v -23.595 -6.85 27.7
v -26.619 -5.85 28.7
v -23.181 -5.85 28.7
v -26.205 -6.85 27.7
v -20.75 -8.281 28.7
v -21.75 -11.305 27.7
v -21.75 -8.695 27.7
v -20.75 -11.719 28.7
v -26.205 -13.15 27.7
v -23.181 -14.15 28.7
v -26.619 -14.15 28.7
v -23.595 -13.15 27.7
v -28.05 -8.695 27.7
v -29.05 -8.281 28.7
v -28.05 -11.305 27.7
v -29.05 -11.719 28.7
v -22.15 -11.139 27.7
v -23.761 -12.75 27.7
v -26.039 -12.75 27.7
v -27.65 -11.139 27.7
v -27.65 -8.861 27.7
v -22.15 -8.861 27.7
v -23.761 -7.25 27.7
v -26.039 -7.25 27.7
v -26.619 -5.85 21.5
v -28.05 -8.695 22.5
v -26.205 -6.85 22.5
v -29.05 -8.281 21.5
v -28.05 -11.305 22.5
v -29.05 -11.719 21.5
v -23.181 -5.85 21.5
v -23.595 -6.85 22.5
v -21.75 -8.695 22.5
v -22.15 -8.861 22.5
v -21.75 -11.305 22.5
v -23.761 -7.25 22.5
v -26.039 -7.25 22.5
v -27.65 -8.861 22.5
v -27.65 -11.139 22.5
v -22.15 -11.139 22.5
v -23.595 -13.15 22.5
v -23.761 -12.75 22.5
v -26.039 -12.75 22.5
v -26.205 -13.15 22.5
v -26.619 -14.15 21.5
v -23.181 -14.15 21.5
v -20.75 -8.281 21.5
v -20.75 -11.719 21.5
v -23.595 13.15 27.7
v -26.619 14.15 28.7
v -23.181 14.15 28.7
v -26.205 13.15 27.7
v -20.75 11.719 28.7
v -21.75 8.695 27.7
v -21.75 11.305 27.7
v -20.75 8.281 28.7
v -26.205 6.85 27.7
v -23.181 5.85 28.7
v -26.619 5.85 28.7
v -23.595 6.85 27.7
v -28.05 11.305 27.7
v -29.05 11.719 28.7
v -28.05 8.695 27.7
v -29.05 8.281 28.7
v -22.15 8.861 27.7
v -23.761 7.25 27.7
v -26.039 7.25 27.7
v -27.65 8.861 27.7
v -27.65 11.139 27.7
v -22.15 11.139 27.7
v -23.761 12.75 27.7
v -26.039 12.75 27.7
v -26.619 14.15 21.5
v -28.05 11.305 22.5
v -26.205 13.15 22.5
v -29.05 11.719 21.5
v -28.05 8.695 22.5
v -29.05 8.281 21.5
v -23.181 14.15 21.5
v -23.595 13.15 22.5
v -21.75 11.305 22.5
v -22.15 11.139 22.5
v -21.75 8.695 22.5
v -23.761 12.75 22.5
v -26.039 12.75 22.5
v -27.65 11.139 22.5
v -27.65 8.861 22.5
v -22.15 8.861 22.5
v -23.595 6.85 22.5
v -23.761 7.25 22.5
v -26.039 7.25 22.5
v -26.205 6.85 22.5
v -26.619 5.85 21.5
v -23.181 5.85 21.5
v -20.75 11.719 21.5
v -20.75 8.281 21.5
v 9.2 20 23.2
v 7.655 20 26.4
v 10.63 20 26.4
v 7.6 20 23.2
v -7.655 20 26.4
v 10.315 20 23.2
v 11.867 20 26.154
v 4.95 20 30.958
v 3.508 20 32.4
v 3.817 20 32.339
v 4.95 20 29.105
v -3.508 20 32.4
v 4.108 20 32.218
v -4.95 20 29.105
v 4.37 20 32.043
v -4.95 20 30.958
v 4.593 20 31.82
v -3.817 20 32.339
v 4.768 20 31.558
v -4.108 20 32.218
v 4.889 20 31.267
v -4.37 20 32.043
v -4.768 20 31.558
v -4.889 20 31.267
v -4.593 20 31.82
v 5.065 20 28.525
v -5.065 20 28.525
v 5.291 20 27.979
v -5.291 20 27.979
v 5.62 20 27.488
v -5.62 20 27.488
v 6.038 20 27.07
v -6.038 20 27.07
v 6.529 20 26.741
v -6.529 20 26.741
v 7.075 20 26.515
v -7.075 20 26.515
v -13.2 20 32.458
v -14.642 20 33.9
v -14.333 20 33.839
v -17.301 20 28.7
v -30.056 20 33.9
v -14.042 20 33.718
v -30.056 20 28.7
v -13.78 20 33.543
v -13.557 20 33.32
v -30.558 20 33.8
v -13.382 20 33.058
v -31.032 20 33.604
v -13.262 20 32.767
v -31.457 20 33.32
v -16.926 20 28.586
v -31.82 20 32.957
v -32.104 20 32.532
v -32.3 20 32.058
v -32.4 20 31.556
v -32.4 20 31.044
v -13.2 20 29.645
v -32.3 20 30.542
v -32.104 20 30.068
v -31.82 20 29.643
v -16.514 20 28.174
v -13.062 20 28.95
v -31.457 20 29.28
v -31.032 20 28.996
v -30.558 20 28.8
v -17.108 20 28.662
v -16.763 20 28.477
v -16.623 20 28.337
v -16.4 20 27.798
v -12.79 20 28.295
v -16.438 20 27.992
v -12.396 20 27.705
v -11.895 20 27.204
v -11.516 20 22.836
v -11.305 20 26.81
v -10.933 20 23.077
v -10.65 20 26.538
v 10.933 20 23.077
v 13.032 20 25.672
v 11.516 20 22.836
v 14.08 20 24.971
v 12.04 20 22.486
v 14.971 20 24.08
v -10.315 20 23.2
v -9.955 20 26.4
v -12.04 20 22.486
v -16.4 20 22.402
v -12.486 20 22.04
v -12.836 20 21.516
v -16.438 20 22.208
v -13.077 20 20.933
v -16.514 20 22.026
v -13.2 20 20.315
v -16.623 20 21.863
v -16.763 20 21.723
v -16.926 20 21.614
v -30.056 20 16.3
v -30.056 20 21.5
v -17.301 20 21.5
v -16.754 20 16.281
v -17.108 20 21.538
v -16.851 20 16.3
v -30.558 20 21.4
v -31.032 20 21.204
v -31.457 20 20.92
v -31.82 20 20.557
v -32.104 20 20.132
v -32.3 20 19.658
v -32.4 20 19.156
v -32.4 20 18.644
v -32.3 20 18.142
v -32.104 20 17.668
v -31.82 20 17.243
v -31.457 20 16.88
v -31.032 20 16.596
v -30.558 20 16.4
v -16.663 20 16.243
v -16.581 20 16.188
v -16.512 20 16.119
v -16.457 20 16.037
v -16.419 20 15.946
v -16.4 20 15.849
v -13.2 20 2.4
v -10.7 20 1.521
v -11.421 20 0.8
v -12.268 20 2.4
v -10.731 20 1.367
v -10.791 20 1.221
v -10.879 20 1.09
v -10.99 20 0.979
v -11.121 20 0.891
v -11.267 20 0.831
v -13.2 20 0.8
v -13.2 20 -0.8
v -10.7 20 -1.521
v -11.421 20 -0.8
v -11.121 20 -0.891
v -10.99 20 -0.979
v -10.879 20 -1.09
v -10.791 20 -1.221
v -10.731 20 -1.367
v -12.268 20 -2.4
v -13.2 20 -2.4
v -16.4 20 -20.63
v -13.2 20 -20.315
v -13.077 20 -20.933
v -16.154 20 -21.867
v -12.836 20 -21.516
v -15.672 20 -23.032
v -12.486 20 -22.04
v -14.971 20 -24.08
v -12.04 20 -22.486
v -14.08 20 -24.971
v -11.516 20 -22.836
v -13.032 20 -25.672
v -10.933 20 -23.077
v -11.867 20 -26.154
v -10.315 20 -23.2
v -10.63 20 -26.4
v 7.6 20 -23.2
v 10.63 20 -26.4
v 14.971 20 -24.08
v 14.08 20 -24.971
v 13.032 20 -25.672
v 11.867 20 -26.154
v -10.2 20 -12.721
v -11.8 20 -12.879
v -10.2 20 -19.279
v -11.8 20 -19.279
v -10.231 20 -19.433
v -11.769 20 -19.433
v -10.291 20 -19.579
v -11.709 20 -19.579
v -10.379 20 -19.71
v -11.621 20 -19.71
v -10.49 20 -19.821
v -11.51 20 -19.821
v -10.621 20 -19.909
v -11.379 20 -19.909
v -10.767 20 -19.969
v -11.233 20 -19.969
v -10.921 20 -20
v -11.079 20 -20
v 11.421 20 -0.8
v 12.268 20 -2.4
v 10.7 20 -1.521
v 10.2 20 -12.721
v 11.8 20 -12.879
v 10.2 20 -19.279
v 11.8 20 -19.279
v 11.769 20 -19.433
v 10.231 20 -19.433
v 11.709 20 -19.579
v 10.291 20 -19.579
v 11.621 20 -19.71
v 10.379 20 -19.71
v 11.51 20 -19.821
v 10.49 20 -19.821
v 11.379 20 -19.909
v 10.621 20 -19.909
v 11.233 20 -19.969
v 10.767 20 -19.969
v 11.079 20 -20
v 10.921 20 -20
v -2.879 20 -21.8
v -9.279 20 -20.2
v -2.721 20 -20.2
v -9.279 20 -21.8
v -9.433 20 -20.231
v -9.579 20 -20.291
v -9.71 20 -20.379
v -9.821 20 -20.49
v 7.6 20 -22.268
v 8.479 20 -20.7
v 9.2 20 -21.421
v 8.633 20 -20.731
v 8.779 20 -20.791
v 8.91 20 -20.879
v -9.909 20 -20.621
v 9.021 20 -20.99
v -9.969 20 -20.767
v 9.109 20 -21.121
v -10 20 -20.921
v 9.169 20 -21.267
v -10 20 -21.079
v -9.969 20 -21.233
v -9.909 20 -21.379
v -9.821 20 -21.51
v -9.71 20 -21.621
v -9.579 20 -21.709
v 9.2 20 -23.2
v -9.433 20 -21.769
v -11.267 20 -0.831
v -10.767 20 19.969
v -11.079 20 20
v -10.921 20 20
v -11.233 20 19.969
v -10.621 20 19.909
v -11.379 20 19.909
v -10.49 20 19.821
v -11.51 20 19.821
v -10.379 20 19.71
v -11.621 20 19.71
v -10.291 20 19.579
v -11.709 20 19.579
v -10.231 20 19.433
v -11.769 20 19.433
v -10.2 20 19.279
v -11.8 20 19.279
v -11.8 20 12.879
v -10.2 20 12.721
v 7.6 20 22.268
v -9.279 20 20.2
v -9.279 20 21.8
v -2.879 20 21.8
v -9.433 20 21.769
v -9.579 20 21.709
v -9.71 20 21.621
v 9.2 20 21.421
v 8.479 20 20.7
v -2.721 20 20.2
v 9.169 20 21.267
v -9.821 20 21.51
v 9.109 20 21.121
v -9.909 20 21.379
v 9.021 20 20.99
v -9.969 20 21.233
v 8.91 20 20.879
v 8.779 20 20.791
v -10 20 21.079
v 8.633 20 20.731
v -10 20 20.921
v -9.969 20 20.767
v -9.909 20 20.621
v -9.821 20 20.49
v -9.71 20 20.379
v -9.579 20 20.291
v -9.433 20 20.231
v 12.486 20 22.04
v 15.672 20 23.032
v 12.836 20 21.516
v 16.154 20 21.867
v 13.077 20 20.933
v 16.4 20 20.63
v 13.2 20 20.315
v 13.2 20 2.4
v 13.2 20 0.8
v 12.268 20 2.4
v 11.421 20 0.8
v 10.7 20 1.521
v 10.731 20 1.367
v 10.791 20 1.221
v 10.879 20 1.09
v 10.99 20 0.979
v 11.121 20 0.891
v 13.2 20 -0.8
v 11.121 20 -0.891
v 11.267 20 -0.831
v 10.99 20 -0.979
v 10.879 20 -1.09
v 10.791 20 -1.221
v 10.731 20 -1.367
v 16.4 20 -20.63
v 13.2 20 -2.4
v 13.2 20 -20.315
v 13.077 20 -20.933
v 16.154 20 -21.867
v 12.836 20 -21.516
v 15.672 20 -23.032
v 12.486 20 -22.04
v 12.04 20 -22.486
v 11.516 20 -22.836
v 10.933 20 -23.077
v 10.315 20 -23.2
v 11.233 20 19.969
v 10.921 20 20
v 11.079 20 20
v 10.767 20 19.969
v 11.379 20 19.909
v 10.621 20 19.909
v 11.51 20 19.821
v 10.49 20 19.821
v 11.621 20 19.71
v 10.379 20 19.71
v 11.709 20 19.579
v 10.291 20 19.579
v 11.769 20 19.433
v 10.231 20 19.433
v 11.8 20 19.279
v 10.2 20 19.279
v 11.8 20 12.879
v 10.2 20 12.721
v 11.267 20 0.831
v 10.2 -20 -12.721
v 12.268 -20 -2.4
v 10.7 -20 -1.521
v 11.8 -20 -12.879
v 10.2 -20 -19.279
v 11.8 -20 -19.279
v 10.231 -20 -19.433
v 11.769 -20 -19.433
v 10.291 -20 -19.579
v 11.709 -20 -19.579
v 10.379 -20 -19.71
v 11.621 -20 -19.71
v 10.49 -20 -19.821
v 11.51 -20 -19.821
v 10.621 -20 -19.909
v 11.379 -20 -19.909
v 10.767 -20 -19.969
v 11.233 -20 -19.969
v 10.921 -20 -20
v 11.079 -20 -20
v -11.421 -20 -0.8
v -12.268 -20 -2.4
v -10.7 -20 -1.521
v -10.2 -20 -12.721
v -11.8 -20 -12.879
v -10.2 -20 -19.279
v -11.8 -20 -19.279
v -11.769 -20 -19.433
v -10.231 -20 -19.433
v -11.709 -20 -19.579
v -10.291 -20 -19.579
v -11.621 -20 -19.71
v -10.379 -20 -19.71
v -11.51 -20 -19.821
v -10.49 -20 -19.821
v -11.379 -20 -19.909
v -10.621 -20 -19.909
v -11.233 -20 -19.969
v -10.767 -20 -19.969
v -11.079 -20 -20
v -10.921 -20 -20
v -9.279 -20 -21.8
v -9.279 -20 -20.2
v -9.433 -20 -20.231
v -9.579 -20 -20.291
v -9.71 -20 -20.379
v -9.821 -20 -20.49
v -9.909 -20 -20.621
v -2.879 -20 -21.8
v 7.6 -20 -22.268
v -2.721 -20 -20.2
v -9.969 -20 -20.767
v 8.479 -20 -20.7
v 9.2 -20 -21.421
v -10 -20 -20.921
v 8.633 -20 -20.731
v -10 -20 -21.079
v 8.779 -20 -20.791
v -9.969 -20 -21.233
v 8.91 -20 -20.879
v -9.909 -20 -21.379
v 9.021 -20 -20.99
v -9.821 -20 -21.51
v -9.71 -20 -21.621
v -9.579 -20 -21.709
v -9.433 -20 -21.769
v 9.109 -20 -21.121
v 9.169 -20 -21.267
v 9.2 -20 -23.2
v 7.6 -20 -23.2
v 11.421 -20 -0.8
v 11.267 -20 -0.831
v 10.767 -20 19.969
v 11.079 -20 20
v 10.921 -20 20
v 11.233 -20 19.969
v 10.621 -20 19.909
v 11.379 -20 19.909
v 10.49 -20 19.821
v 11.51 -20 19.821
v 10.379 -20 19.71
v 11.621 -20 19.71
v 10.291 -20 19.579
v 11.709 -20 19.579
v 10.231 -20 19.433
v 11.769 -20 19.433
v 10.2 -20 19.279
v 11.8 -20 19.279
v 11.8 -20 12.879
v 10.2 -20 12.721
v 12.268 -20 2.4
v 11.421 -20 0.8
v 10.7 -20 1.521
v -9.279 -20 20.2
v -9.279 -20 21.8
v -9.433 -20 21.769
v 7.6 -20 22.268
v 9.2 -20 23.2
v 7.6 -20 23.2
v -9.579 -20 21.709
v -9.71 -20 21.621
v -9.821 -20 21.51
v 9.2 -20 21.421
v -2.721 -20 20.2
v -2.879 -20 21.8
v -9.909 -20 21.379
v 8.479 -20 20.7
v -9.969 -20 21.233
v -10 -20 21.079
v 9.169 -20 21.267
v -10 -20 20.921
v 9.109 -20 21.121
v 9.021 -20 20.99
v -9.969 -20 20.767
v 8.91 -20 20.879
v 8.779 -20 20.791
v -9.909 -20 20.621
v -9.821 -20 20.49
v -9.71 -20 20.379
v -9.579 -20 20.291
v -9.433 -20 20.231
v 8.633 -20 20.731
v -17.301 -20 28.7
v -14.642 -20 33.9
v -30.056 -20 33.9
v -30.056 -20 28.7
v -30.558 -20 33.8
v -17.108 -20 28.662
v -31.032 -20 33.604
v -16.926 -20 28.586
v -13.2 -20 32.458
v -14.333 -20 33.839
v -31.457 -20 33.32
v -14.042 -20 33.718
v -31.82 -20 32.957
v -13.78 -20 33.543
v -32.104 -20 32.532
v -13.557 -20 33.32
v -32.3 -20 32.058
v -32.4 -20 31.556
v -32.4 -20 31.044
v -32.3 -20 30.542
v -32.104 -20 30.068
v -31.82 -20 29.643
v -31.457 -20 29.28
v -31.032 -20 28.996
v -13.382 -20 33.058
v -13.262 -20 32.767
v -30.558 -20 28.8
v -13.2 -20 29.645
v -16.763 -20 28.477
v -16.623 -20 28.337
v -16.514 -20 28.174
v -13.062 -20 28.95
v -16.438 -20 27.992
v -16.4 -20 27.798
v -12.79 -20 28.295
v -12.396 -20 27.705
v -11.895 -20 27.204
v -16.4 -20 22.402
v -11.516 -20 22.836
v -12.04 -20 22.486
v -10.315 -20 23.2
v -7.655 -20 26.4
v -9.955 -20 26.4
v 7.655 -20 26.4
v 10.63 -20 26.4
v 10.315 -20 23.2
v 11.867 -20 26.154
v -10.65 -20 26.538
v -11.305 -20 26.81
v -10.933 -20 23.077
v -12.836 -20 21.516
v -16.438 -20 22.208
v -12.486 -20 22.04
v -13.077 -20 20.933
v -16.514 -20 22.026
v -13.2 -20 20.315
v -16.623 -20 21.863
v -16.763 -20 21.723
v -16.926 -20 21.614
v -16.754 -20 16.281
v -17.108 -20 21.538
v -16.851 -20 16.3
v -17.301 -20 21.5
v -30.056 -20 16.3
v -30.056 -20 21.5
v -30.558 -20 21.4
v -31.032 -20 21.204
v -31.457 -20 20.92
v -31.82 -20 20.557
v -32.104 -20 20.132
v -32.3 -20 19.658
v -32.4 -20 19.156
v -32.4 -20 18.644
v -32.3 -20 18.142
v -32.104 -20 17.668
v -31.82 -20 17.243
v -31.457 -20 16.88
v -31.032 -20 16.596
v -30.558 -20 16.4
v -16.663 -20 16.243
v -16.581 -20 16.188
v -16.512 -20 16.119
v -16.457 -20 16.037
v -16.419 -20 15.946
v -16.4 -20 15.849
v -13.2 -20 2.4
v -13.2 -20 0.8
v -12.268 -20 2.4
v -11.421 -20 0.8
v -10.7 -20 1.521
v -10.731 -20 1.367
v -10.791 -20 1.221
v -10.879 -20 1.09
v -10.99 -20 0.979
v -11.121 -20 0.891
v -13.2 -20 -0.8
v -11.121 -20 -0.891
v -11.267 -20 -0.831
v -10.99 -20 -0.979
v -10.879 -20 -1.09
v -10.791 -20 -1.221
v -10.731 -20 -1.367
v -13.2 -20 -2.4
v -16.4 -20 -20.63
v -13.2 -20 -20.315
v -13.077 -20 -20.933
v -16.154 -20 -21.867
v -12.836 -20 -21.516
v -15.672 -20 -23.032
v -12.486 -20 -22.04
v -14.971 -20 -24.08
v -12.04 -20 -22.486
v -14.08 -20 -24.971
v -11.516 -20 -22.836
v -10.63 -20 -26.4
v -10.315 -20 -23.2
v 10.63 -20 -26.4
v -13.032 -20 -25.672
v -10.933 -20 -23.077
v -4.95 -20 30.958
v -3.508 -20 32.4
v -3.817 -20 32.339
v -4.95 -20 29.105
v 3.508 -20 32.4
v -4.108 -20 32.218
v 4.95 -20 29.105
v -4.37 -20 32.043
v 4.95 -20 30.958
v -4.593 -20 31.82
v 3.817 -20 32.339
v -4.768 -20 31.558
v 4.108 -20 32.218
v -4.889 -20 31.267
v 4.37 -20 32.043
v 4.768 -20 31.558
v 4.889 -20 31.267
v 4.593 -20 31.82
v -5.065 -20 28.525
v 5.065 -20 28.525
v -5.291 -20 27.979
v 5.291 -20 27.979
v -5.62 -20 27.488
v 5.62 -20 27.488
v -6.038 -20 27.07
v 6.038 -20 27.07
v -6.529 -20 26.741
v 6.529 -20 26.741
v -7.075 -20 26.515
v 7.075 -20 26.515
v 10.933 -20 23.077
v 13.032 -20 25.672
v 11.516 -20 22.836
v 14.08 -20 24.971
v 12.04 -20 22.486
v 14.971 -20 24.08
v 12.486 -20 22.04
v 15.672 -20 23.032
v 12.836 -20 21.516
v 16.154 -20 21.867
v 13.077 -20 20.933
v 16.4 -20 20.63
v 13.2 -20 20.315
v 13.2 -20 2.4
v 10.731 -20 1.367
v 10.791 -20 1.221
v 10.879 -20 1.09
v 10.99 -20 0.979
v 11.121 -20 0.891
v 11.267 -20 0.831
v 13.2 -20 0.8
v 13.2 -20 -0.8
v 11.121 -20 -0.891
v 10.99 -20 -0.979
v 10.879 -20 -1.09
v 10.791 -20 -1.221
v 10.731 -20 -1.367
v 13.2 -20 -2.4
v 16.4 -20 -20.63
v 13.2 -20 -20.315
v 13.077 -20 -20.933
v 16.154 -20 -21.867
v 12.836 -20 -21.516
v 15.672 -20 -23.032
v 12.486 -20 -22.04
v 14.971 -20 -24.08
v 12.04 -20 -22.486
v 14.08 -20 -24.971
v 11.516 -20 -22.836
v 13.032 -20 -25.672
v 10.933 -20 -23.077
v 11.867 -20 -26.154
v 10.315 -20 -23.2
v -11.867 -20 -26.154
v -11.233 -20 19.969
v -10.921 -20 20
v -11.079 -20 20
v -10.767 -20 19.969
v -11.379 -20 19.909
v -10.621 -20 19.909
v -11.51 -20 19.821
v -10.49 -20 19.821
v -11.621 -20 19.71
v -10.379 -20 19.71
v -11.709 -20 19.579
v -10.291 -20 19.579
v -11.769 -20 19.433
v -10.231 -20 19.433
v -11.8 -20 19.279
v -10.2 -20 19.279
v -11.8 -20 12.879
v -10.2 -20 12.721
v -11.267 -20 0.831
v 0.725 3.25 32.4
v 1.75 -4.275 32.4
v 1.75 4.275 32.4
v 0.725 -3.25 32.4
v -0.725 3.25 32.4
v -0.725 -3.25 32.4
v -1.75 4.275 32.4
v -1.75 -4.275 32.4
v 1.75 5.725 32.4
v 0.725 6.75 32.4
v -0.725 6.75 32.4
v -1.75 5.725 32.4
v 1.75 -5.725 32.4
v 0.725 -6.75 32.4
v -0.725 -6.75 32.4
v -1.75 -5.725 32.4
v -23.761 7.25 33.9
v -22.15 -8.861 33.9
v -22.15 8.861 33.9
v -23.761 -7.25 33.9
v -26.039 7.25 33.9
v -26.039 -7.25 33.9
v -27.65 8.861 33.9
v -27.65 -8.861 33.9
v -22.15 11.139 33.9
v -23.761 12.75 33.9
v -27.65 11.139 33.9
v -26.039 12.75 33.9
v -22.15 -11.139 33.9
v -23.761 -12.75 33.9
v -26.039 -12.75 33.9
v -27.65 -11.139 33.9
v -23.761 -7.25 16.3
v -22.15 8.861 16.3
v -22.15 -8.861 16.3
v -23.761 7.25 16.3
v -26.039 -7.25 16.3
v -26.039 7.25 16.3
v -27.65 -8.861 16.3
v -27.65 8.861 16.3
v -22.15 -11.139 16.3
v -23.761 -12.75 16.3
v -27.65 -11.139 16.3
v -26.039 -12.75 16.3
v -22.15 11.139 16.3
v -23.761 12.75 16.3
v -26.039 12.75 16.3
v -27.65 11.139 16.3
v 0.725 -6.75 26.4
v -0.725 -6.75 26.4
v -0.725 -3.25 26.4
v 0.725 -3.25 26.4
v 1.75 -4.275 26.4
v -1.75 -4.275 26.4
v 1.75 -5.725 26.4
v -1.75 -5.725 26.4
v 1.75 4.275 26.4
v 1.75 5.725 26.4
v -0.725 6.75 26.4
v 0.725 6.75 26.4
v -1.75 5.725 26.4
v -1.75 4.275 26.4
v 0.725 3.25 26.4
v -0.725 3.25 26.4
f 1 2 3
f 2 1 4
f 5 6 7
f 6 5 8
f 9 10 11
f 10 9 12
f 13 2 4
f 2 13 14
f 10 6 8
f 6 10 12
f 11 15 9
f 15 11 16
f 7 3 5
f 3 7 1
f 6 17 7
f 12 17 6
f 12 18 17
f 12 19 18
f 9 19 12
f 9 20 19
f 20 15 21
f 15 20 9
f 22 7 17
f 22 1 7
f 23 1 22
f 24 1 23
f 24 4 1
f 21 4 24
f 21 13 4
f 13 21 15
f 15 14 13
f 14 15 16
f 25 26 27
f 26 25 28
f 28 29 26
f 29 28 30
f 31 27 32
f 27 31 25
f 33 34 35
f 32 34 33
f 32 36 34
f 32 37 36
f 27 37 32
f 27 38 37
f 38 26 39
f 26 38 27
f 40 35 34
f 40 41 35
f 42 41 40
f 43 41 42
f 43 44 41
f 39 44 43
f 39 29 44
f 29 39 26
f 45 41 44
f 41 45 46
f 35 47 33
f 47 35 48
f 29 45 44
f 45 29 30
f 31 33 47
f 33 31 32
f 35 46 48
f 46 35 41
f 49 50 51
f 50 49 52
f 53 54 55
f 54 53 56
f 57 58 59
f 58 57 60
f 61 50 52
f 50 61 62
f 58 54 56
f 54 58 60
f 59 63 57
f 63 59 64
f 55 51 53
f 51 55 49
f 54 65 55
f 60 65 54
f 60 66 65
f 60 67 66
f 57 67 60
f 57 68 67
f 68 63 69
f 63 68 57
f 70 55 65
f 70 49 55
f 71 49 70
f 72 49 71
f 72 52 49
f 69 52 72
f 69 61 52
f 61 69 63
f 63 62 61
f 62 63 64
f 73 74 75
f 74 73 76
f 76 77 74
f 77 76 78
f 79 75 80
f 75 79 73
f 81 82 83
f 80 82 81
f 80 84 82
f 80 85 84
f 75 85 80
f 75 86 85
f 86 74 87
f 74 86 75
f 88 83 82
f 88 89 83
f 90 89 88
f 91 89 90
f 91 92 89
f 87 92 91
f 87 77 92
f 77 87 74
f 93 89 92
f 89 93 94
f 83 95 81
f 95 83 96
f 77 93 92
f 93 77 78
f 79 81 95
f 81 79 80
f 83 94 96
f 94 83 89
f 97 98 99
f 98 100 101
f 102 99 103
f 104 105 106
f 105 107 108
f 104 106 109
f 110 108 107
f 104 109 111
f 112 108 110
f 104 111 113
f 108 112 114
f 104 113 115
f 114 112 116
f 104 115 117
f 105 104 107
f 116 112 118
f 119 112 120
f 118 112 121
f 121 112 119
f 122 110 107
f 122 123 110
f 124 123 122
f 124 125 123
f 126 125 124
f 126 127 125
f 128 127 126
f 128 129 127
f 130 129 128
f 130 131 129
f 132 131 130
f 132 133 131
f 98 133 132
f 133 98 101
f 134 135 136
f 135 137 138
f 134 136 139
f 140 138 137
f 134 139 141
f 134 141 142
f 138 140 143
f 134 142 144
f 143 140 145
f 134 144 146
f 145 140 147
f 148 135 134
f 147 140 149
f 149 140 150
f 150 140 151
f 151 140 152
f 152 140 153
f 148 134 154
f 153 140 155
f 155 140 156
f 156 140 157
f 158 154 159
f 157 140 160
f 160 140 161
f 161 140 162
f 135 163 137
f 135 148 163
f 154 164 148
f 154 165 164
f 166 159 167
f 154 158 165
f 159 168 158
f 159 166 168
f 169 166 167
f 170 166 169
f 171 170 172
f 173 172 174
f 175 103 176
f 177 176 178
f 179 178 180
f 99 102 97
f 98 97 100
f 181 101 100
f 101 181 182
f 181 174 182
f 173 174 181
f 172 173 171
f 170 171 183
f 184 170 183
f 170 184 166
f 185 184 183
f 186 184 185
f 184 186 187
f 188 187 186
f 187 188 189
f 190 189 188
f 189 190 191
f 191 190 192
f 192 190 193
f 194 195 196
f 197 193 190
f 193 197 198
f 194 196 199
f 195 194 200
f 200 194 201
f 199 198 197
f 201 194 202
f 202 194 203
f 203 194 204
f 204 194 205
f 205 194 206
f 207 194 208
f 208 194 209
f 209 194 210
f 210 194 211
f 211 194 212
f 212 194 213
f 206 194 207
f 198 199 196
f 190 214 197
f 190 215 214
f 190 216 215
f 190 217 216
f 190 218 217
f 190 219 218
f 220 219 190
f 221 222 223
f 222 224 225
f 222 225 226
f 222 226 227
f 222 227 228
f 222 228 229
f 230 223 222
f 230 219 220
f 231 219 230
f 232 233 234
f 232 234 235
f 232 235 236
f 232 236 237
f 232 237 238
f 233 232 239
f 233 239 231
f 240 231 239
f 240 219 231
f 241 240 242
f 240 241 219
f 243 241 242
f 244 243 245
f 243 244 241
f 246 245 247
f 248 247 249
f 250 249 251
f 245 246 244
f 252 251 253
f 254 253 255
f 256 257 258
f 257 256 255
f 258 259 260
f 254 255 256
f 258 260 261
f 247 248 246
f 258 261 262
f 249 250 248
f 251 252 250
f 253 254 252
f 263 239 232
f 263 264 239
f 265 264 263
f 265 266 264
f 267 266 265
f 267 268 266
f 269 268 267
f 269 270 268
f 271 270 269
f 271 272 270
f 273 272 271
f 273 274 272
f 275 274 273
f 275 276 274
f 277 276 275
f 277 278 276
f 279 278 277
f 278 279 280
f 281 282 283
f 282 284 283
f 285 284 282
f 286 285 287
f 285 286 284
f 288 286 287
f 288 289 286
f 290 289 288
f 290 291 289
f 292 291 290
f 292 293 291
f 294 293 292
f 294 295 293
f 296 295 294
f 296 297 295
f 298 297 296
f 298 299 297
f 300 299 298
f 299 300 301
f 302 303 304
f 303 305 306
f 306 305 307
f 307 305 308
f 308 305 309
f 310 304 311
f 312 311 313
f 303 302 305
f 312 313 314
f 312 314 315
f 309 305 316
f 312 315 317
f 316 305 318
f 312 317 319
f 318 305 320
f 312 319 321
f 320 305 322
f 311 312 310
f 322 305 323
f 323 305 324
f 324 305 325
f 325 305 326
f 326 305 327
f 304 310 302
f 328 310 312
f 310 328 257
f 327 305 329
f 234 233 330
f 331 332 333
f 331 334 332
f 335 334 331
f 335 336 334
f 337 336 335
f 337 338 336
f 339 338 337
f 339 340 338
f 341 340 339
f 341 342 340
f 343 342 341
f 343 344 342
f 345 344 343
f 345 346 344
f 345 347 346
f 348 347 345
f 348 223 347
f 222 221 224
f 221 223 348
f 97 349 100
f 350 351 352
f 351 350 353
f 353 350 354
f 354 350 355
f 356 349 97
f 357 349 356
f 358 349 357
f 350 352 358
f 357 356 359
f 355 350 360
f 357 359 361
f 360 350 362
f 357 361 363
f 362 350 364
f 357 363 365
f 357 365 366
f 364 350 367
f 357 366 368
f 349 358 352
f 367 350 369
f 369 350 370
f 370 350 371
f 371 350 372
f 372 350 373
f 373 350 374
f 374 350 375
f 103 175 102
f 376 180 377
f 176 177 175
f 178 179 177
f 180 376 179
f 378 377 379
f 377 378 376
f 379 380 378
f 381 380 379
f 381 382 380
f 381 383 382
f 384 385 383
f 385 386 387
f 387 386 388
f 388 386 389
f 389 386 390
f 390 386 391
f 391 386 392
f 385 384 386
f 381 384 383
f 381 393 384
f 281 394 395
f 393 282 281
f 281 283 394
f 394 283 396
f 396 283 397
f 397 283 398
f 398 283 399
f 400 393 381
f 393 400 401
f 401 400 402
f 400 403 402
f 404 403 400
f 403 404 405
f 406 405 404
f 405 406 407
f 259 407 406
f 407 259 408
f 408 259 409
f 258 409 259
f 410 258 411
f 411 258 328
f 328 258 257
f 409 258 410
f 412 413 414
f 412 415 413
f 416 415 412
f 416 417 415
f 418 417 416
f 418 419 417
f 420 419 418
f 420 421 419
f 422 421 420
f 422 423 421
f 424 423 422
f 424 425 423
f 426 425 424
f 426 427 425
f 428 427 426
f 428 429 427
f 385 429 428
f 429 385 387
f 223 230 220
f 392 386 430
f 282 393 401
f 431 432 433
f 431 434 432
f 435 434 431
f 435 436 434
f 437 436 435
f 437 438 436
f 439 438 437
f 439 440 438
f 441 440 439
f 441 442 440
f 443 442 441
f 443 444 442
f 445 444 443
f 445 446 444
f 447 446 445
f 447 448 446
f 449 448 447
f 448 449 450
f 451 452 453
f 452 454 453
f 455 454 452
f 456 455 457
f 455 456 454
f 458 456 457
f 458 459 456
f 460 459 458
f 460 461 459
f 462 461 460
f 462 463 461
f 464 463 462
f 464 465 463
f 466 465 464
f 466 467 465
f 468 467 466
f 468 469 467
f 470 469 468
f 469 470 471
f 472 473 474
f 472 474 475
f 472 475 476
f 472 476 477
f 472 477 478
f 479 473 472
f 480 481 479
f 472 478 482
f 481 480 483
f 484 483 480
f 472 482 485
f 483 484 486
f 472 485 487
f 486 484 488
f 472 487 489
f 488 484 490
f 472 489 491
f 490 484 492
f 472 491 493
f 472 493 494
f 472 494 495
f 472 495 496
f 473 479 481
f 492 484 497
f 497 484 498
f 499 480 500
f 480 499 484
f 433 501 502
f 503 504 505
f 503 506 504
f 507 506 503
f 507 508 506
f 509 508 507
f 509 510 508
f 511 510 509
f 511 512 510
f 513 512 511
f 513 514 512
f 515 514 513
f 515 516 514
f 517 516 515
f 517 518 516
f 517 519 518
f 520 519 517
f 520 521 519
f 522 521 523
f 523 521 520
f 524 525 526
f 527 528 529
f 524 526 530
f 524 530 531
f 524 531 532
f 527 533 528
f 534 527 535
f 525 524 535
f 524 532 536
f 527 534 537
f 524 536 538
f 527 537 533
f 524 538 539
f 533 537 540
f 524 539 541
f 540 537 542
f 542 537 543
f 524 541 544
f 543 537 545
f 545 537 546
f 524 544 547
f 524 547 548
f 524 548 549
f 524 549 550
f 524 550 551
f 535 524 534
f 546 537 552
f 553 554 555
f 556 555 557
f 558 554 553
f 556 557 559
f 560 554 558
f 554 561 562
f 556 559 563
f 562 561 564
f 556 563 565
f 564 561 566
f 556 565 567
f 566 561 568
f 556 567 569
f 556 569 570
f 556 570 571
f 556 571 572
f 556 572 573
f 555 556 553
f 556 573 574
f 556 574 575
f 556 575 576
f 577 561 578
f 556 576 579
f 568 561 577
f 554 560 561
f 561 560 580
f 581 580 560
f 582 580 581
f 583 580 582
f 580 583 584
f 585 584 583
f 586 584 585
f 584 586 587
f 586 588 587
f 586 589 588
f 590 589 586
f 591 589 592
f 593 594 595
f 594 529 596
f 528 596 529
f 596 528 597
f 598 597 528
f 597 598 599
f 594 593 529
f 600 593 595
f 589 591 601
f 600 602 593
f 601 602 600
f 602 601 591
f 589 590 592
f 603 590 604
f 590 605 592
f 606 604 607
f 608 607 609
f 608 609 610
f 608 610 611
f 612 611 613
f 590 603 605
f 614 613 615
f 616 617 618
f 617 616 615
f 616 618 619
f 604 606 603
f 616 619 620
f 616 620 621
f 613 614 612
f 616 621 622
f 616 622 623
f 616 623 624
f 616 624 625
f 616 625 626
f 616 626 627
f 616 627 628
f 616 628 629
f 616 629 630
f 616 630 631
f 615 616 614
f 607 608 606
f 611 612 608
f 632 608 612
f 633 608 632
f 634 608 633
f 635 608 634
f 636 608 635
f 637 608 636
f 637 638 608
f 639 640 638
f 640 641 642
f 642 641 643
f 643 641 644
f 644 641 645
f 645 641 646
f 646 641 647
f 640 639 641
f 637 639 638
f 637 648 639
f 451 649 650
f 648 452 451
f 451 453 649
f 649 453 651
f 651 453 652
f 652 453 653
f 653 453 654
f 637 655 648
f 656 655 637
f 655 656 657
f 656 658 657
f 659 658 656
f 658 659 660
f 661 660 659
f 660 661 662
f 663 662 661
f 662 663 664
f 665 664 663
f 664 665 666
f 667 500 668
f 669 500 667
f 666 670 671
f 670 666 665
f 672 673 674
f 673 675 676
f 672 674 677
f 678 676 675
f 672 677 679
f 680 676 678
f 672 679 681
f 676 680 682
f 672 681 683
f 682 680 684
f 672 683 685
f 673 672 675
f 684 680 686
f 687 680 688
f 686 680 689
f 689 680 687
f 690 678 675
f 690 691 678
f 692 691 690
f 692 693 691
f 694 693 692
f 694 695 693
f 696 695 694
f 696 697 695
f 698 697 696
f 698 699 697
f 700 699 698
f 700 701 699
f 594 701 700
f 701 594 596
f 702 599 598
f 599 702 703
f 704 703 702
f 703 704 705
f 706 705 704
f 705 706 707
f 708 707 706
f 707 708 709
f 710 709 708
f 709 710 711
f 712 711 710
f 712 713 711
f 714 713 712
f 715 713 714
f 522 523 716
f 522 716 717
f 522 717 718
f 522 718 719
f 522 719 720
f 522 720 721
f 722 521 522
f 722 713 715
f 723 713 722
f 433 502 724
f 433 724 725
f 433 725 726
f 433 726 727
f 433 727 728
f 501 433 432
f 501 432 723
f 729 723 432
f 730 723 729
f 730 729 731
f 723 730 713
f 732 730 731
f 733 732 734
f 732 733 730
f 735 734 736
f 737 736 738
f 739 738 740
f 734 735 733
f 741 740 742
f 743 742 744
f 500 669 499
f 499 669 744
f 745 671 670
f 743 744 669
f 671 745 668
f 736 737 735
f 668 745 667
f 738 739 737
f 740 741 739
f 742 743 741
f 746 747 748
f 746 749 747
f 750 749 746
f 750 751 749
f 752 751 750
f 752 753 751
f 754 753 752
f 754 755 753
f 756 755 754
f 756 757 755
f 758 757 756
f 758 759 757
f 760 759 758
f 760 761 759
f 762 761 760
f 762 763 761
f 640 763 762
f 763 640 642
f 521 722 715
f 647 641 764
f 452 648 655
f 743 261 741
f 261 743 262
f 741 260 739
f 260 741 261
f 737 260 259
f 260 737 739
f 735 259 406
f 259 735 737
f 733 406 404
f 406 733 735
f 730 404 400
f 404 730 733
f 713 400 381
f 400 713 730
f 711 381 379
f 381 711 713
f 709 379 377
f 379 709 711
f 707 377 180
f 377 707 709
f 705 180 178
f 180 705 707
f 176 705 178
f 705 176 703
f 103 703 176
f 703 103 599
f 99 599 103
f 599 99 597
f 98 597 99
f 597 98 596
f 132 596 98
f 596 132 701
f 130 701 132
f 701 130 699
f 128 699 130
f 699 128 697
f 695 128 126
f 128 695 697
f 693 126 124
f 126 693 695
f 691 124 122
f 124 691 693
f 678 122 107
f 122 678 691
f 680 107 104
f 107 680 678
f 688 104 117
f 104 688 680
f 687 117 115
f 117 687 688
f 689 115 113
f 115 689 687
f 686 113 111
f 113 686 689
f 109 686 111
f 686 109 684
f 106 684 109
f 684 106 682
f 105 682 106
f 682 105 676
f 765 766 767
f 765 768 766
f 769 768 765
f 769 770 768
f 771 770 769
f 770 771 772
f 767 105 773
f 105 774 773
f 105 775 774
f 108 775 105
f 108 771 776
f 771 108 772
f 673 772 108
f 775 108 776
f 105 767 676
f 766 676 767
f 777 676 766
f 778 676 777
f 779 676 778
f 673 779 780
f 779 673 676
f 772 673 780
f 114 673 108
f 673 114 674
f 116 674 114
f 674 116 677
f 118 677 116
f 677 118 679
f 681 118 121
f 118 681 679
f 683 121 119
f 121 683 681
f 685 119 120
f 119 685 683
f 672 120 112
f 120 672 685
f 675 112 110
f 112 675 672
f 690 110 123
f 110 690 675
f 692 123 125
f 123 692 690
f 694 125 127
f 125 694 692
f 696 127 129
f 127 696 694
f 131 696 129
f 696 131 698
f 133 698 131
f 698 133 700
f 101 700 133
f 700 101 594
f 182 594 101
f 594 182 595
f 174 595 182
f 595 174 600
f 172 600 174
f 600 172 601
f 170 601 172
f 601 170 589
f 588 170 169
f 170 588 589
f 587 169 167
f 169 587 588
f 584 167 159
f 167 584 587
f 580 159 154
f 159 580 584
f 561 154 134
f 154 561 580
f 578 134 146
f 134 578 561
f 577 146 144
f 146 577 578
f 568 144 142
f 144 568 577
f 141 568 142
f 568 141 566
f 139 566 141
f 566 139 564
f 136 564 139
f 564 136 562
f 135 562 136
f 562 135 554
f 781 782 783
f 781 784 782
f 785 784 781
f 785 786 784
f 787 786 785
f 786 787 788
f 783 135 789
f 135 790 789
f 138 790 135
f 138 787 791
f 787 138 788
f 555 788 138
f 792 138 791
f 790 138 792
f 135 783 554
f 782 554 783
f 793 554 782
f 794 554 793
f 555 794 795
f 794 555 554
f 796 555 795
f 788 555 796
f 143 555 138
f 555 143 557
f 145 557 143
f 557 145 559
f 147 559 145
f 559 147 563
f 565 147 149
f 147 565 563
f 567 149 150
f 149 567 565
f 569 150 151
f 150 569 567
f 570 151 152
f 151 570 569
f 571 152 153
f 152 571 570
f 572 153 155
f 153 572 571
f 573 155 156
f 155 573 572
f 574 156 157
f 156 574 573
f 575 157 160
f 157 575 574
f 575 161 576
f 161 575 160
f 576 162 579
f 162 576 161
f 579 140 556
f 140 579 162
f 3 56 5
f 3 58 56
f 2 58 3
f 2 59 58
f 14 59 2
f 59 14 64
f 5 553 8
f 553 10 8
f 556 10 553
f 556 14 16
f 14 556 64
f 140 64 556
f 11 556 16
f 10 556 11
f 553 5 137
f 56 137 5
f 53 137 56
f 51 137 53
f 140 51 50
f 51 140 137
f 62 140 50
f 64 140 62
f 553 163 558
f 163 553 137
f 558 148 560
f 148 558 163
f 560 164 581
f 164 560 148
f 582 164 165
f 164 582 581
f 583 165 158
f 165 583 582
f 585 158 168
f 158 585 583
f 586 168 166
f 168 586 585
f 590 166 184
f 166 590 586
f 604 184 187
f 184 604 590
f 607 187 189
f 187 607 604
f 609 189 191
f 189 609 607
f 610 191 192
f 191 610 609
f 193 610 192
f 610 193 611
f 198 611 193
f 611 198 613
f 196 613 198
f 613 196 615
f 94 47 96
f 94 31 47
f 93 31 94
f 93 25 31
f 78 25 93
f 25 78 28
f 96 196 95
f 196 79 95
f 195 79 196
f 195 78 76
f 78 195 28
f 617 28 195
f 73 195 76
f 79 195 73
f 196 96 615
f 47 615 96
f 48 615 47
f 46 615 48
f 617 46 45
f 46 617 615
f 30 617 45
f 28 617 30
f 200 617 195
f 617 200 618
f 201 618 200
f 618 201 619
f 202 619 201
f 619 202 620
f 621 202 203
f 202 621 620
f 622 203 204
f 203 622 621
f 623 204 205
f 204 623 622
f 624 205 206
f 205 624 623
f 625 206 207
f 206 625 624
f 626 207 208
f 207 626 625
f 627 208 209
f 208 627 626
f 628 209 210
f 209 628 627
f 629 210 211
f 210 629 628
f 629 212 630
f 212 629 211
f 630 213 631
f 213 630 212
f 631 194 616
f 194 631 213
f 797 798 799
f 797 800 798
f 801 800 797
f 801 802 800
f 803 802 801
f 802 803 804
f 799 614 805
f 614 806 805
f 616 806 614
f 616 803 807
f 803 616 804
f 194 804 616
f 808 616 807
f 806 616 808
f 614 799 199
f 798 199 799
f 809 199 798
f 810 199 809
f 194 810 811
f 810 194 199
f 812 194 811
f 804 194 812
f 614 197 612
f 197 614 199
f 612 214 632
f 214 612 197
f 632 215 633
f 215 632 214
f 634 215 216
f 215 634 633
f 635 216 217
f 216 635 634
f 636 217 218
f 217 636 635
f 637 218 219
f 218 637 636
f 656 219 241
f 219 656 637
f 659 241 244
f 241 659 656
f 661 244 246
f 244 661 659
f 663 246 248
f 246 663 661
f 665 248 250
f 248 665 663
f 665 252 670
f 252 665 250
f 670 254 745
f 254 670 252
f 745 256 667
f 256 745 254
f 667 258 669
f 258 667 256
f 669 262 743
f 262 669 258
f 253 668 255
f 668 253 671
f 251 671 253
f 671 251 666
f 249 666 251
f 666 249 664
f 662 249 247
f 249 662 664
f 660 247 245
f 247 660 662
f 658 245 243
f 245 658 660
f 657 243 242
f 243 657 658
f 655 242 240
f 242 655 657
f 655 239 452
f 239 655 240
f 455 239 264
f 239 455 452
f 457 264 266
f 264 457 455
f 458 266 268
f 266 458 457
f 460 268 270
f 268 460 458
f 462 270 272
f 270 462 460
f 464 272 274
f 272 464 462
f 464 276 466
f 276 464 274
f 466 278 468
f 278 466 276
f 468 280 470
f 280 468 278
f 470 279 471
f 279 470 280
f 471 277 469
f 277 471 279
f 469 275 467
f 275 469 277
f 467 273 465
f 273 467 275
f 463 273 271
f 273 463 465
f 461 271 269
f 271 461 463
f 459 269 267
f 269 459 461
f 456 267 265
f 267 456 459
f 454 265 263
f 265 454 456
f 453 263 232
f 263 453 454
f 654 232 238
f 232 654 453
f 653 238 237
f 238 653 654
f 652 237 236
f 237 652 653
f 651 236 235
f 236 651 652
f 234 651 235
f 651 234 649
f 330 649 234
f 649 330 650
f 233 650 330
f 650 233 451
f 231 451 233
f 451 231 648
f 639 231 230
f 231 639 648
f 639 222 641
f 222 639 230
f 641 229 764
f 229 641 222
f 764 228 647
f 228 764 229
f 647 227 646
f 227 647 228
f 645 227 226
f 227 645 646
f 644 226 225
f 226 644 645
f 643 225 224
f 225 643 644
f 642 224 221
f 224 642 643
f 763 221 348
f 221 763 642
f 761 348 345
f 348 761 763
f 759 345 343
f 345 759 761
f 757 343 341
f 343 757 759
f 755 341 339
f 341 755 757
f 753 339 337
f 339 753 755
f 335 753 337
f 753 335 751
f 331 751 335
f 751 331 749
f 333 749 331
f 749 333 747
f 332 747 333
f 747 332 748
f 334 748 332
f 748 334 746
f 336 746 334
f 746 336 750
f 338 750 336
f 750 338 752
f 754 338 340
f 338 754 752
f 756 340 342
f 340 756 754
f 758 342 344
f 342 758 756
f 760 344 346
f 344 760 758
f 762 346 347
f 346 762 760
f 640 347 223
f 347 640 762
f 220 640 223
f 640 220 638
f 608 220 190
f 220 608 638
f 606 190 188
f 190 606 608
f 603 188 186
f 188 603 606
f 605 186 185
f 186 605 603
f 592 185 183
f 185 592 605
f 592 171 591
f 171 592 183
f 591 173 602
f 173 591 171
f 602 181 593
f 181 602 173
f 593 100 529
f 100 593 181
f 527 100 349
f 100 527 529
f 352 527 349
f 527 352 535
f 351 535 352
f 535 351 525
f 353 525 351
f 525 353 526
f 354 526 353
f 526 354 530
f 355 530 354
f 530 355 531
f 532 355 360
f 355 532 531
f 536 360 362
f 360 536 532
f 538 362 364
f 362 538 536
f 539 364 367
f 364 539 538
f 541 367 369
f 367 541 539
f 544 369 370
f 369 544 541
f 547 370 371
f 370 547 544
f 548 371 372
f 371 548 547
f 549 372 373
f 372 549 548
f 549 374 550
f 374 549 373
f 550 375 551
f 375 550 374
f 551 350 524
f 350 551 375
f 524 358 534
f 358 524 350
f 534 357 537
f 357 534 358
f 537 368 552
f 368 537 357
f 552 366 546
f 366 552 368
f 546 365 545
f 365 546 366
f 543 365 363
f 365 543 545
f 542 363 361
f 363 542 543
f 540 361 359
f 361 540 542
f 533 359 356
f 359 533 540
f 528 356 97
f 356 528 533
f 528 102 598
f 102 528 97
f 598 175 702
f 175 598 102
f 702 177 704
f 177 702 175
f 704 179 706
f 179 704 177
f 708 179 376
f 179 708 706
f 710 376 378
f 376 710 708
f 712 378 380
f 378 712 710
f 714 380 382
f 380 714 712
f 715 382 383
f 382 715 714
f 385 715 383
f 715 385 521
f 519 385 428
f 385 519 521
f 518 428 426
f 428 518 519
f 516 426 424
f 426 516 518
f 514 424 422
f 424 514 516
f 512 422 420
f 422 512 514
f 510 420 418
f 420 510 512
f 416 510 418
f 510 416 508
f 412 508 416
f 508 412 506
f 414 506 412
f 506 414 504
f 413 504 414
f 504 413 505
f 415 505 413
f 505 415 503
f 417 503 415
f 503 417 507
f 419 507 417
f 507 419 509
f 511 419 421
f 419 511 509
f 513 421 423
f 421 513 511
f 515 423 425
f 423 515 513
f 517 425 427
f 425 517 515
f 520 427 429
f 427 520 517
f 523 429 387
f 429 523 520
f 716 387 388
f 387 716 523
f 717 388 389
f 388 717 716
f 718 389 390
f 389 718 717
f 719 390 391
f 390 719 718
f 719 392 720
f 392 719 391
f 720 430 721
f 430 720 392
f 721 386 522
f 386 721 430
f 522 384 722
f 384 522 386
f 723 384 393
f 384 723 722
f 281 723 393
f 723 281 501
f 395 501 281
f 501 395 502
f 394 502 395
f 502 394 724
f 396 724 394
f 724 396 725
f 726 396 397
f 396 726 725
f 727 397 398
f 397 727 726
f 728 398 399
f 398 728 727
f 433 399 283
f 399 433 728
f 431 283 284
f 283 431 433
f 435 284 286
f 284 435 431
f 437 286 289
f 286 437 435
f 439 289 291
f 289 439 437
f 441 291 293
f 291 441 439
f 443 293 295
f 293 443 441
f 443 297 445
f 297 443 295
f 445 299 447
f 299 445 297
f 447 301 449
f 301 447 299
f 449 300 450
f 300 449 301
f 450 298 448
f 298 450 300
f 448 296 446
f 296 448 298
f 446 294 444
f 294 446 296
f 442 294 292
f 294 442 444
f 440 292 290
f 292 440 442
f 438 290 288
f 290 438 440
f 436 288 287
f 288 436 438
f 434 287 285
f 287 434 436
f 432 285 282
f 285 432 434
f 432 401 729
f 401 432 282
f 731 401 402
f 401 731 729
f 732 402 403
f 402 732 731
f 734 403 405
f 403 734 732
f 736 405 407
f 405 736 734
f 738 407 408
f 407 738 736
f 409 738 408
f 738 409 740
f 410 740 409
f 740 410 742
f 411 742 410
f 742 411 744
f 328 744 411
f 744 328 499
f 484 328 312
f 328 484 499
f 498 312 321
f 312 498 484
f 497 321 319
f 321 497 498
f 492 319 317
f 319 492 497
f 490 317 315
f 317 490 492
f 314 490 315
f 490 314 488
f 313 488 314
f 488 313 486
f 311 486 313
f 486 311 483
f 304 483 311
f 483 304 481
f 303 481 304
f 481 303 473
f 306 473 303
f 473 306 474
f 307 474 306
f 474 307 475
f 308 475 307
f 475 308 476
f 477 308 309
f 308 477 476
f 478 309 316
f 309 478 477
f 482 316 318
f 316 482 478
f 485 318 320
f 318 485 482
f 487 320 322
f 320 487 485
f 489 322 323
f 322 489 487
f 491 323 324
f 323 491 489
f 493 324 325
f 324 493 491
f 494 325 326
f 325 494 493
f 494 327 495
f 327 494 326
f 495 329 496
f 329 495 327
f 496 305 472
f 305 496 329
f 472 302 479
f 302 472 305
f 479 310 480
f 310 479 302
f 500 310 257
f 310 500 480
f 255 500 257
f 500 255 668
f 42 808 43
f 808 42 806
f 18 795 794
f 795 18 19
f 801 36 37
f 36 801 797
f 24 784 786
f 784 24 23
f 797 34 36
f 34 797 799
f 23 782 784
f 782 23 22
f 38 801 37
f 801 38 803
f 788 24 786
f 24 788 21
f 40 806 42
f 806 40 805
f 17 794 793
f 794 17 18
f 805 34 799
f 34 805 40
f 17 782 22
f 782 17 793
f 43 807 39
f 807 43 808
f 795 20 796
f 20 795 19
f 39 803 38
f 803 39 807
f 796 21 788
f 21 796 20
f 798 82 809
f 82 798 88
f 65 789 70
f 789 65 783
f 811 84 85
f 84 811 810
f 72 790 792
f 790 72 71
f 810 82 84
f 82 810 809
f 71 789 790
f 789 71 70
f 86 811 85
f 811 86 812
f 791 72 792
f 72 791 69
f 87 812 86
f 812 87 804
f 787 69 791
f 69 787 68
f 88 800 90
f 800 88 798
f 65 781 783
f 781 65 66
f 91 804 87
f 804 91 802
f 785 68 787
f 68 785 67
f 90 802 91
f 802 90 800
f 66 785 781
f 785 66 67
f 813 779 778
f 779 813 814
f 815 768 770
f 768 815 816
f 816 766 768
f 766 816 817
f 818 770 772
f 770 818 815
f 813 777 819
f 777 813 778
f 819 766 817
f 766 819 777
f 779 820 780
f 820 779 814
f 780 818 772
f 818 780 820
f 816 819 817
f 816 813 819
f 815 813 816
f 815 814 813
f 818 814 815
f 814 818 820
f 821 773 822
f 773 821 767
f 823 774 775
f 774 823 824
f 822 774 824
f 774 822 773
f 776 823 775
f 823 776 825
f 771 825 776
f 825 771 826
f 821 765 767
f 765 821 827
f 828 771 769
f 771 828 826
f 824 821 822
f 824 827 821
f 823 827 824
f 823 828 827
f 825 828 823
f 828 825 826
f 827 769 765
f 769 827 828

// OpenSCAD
// file: lib/util.scad
resolution = 32;

function accurate_diam(diam,sides) = 1 / cos(180/sides) / 2 * diam;

module hole(diam,len,sides=8) {
  rotate([0,0,180/sides]) {
    cylinder(r=accurate_diam(diam,sides),h=len,center=true,$fn=sides);
  }
}

module accurate_circle(diam,sides=8) {
  rotate([0,0,180/sides]) {
    circle(r=accurate_diam(diam,sides),$fn=sides);
  }
}

module debug_axes() {
  color("red") translate([50,0,0]) cube([100,.2,.2],center=true);
  color("green") translate([0,50,0]) cube([.2,100,.2],center=true);
  color("blue") translate([0,0,50]) cube([.2,.2,100],center=true);
}

module ring(id,thickness,height,fn=16) {
  od = id + thickness;
  linear_extrude(height=height,center=true) {
    difference() {
      accurate_circle(od,fn);
      accurate_circle(id,fn);
    }
  }
}

module rounded_square(width,depth,diam,fn=resolution) {
  pos_x = width/2-diam/2;
  pos_y = depth/2-diam/2;

  hull() {
    for(x=[left,right]) {
      for(y=[front,rear]) {
        translate([x*pos_x,y*pos_y,0]) {
          accurate_circle(diam,fn);
        }
      }
    }
  }
}

module rounded_cube(width,depth,height,diam,fn=resolution) {
  linear_extrude(height=height,center=true,convexity=3) {
    rounded_square(width,depth,diam,fn);
  }
}

module round_corner_filler(diam,length) {
  linear_extrude(height=length,center=true,convexity=3) {
    round_corner_filler_profile(diam);
  }
}

module round_corner_filler_profile(diam,res=resolution) {
  difference() {
    translate([diam/4,diam/4,0]) {
      square([diam/2,diam/2],center=true);
    }
    translate([diam/2,diam/2,0]) {
      accurate_circle(diam,res);
    }
  }
}

module space_along_length(length,min_hole_spacing=4*inch,from_end=1*inch) {
  avail_length = length - (from_end*2);
  num_spaces   = floor(avail_length / min_hole_spacing);
  extra_space  = (avail_length - (num_spaces*min_hole_spacing)) / num_spaces;
  spacing      = min_hole_spacing + extra_space;

  // echo(length, num_spaces, spacing);

  translate([0,-length/2+from_end,0]) {
    for(y=[0:num_spaces]) {
      translate([0,y*spacing,0]) {
        children();
      }
    }
  }
}

module letter_spike(thin_width,thick_width,thickness) {
  hull() {
    cylinder(r=thin_width,h=thickness*2,center=true,$fn=16);
    cylinder(r=thick_width,h=0.01,center=true,$fn=16);
  }
}

module letter_L(width=10,height=20,thickness=0.5,thick_width=2,thin_width=0.3) {
  lines = [
    [
      [-width/2,height/2,0],
      [-width/2,-height/2,0],
    ],
    [
      [-width/2,-height/2,0],
      [width/2,-height/2,0],
    ],
  ];

  for(pair=lines) {
    hull() {
      for(vect=pair) {
        translate(vect) {
          letter_spike(thin_width,thick_width,thickness);
        }
      }
    }
  }
}

module letter_R(width=10,height=20,thickness=0.5,thick_width=2,thin_width=0.3) {
  lines = [
    [
      [-width/2,height/2,0],
      [-width/2,-height/2,0],
    ],
    [
      [-width/2,height/2,0],
      [width/2,height/3,0],
    ],
    [
      [width/2,height/3,0],
      [-width/4,0,0],
    ],
    [
      [-width/2,0,0],
      [-width/4,0,0],
    ],
    [
      [-width/4,0,0],
      [width/2,-height/2,0],
    ],
  ];

  for(pair=lines) {
    hull() {
      for(vect=pair) {
        translate(vect) {
          letter_spike(thin_width,thick_width,thickness);
        }
      }
    }
  }
}

module zip_tie_cavity(inner_diam_input,zip_tie_thickness,zip_tie_width,fn=resolution) {
  inner_diam = inner_diam_input -0.05;
  overall_width = inner_diam+zip_tie_thickness*2;

  module profile() {
    for(x=[left,right]) {
      translate([x*(inner_diam/2+zip_tie_thickness/2),overall_width,0]) {
        square([zip_tie_thickness,overall_width*2],center=true);
      }
    }

    intersection() {
      translate([0,-overall_width,0]) {
        square([overall_width*2,overall_width*2],center=true);
      }
      difference() {
        accurate_circle(inner_diam+zip_tie_thickness*2,fn);
        accurate_circle(inner_diam,fn);
      }
    }
  }

  linear_extrude(height=zip_tie_width,convexity=3,center=true) {
    profile();
  }
}

module printed_extrusion_carriage_profile(body_width,body_height) {
  spring_thickness = extrude_width*4;
  spring_gap_width = 1;
  preload = -0.2; // negative makes more slack both for print and UHMWPE tape
  wall_thickness = extrude_width*4;

  cavity_width = body_width - wall_thickness*4;
  cavity_height = body_height - wall_thickness*4;

  module spring_profile() {
    contact_width = 8;

    translate([0,-preload+spring_thickness/2]) {
      translate([left*(y_rail_extrusion_width/2-contact_width/2),0,0]) {
        rounded_square(contact_width,spring_thickness,spring_thickness);
      }
      hull() {
        translate([left*(y_rail_extrusion_width/2-contact_width+spring_thickness/2),0,0]) {
          accurate_circle(spring_thickness,resolution);
        }
        translate([right*(y_rail_extrusion_width/2-spring_thickness),spring_gap_width/2,0]) {
          accurate_circle(spring_thickness,resolution);
        }
      }
      translate([right*(y_rail_extrusion_width/2-spring_thickness),2-spring_thickness/2+spring_gap_width/2,0]) {
        rounded_square(spring_thickness,4,spring_thickness);
      }
    }
  }

  for(z=[top,bottom]) {
    mirror([0,1-z,0]) {
      translate([0,y_rail_extrusion_height/2]) {
        spring_profile();
      }

      for(x=[left,right]) {
        mirror([1-x,0,0]) {
          translate([y_rail_extrusion_width/2,y_rail_extrusion_height/4,0]) {
            rotate([0,0,-90]) {
              spring_profile();
            }
          }
        }
      }
    }
  }

  difference() {
    gap_width = cavity_height - y_rail_extrusion_height;
    rounded_square(body_width,body_height,wall_thickness*8);
    rounded_square(cavity_width,cavity_height,gap_width);
  }
}

/*
translate([-10,0,0]) {
  letter_L();
}

translate([10,0,0]) {
  letter_R();
}
*/
// main file
include <config.scad>;
include <lib/util.scad>;
use <lib/vitamins.scad>;

y_carriage_depth = 40;

module ptfe_y_carriage(side) {
  y_carriage_overall_width  = y_rail_extrusion_width+printed_carriage_outer_skin_from_extrusion*2;
  y_carriage_overall_height  = y_rail_extrusion_height+printed_carriage_outer_skin_from_extrusion*2;

  line_bearing_pos_x = x_rail_end_relative_to_y_rail_x - line_bearing_diam/2;
  line_bearing_pos_z = x_rail_end_relative_to_y_rail_z + 10 + line_bearing_above_extrusion;
  line_bearing_hole_diam = line_bearing_inner+0.5;

  module xz_position_for_line_bearing() {
    translate([line_bearing_pos_x,0,line_bearing_pos_z]) {
      children();
    }
  }

  for(y=[front,rear]) {
    translate([0,y*10,0]) {
      xz_position_for_line_bearing() {
        % line_bearing();
      }
    }
  }

  translate([x_rail_end_relative_to_y_rail_x,0,x_rail_end_relative_to_y_rail_z]) {
    translate([-20,0,0]) {
      rotate([0,90,0]) {
        rotate([0,0,90]) {
          % extrusion_2040(40);
        }
      }
    }
  }

  module carriage_profile() {
    module profile_body() {
      rounded_square(y_carriage_overall_width,y_carriage_overall_height,printed_carriage_outer_diam);

      // arm to mount x rail / line bearing and support
      arm_support_joint_to_carriage_width = gap_between_x_rail_end_and_y_carriage + printed_carriage_wall_thickness;
      arm_support_overall_height = line_bearing_thickness+2*(bearing_bevel_height+printed_carriage_wall_thickness);
      translate([line_bearing_pos_x,line_bearing_pos_z]) {
        translate([arm_support_joint_to_carriage_width/2,0,0]) {
          for(z=[top,bottom]) {
            translate([0,z*(arm_support_overall_height/2-printed_carriage_wall_thickness/2)]) {
              rounded_square(line_bearing_diam+arm_support_joint_to_carriage_width,printed_carriage_wall_thickness,printed_carriage_inner_diam);
            }
          }
        }

        // join the top and bottom supports
        translate([line_bearing_diam/2+gap_between_x_rail_end_and_y_carriage+printed_carriage_wall_thickness/2,0,0]) {
          rounded_square(printed_carriage_wall_thickness,arm_support_overall_height,printed_carriage_inner_diam);
        }

        for(z=[top,bottom]) {
          translate([line_bearing_diam/2+gap_between_x_rail_end_and_y_carriage,z*(arm_support_overall_height/2-printed_carriage_wall_thickness)]) {
            rotate([0,0,135+z*(45)]) {
              round_corner_filler_profile(bearing_bevel_height*2);
            }
          }
        }
      }

      translate([line_bearing_pos_x+line_bearing_diam/2+arm_support_joint_to_carriage_width,y_carriage_overall_height/2,0]) {
        round_corner_filler_profile(printed_carriage_inner_diam);
      }

      translate([-y_carriage_overall_width/2,line_bearing_pos_z-arm_support_overall_height/2,0]) {
        rotate([0,0,-180]) {
          round_corner_filler_profile(gap_between_x_rail_end_and_y_carriage);
        }
      }
    }

    module profile_holes() {
      rounded_square(y_carriage_opening_depth,y_carriage_opening_height,printed_carriage_inner_diam);
    }

    difference() {
      profile_body();
      profile_holes();
    }
  }

  translate([0,0,40]) {
    color("green") {
      // carriage_profile();
    }
  }

  module body() {
    rotate([90,0,0]) {
      linear_extrude(height=y_carriage_depth,center=true,convexity=3) {
        carriage_profile();
      }
    }

    xz_position_for_line_bearing() {
      // make it easier to feed the line through?
      difference() {
        translate([line_bearing_diam/4+1,0,0]) {
          cube([line_bearing_diam/2,20,line_bearing_thickness+bearing_bevel_height*2+1],center=true);
        }
        for(y=[front,rear]) {
          translate([0,y*10,0]) {
            hole(line_bearing_diam+gap_between_x_rail_end_and_y_carriage*2+0.5,line_bearing_thickness*2,32);
          }
        }
      }

      // line bearing bevels
      for(y=[front,rear]) {
        for(z=[top,bottom]) {
          translate([0,y*10,z*(line_bearing_thickness/2+bearing_bevel_height+1)]) {
            hull() {
              hole(line_bearing_hole_diam+extrude_width*2,(bearing_bevel_height+1)*2);
              hole(line_bearing_hole_diam+(extrude_width+bearing_bevel_height)*2,2);
            }
          }
        }
      }
    }
  }

  module holes() {
    bushing_from_wall = x_rail_extrusion_height/5;

    // PTFE bushings
    for(y=[front,rear]) {
      translate([0,y*(y_carriage_depth/2-printed_carriage_bushing_from_end-printed_carriage_bushing_len/2),0]) {
        rotate([90,0,0]) {
          rotate([0,0,90]) {
            linear_extrude(height=printed_carriage_bushing_len,center=true) {
              ptfe_bushing_profile_for_2040_extrusion();
            }
          }
        }
      }
    }

    xz_position_for_line_bearing() {
      // line bearing holes
      for(y=[front,rear]) {
        for(z=[top,bottom]) {
          translate([0,y*10,0]) {
            hull() {
              hole(line_bearing_hole_diam,30);
            }
          }
        }
      }
    }

    // mounting holes for misc
    if (side == right) {
      for(y=[-5,5]) {
        translate([0,y,y_carriage_overall_height/2]) {
          hole(threaded_insert_diam,printed_carriage_wall_thickness*2+1,8);
        }
      }
    }
  }

  difference() {
    body();
    holes();
  }
}

module preloaded_spring_y_carriage(side) {
  misc_mount_hole_spacing = 10;
  misc_mount_hole_diam = threaded_insert_diam;
  misc_mount_hole_len = 6;

  wall_thickness = extrude_width*4;
  y_carriage_overall_width  = y_rail_extrusion_width+printed_carriage_outer_skin_from_extrusion*2;
  y_carriage_overall_height  = y_rail_extrusion_height+printed_carriage_outer_skin_from_extrusion*2;

  line_bearing_pos_x = x_rail_end_relative_to_y_rail_x - line_bearing_diam/2;
  line_bearing_pos_z = x_rail_end_relative_to_y_rail_z + 10 + line_bearing_above_extrusion;
  line_bearing_hole_diam = line_bearing_inner+0.5;
  line_bearing_thickness_gap = line_bearing_thickness + tolerance;

  module xz_position_for_line_bearing() {
    translate([line_bearing_pos_x,0,line_bearing_pos_z]) {
      children();
    }
  }

  for(y=[front,rear]) {
    translate([0,y*10,0]) {
      xz_position_for_line_bearing() {
        % line_bearing();
      }
    }
  }

  translate([x_rail_end_relative_to_y_rail_x,0,x_rail_end_relative_to_y_rail_z]) {
    translate([-20,0,0]) {
      rotate([0,90,0]) {
        rotate([0,0,90]) {
          % extrusion_2040(40);
        }
      }
    }
  }

  /*
  translate([0,0,50]) {
    color("blue") carriage_profile();

    rotate([0,0,90]) {
      color("grey") extrusion_2040(3);
    }
  }
  */


  cavity_overall_width = y_carriage_overall_width - wall_thickness*4;

  bearing_arm_thickness = printed_carriage_wall_thickness;
  bearing_arm_support_joint_to_carriage_width = gap_between_x_rail_end_and_y_carriage + wall_thickness;
  bearing_arm_support_overall_height = line_bearing_thickness_gap+2*(bearing_bevel_height+bearing_arm_thickness);

  module carriage_profile() {
    module profile_body() {
      printed_extrusion_carriage_profile(y_carriage_overall_width,y_carriage_overall_height);

      // arm to mount x rail / line bearing and support
      translate([line_bearing_pos_x,line_bearing_pos_z]) {
        for(z=[top,bottom]) {
          translate([0,z*(bearing_arm_support_overall_height/2-bearing_arm_thickness/2)]) {
            hull() {
              rounded_square(line_bearing_diam,bearing_arm_thickness,bearing_arm_thickness);
              translate([line_bearing_diam/2+bearing_arm_support_joint_to_carriage_width/2,0,0]) {
                square([bearing_arm_support_joint_to_carriage_width,bearing_arm_thickness],center=true);
              }
            }
          }
        }

        // join the top and bottom supports
        translate([line_bearing_diam/2+gap_between_x_rail_end_and_y_carriage+wall_thickness,0,0]) {
          rounded_square(wall_thickness*2,bearing_arm_support_overall_height,wall_thickness*2);
        }

        for(z=[top,bottom]) {
          translate([line_bearing_diam/2+gap_between_x_rail_end_and_y_carriage,z*(bearing_arm_support_overall_height/2-bearing_arm_thickness)]) {
            rotate([0,0,135+z*(45)]) {
              round_corner_filler_profile(bearing_bevel_height*2);
            }
          }
        }
      }

      // meat for misc mounting holes
      if (side == right) {
        body_width = misc_mount_hole_diam+wall_thickness*4;
        translate([0,y_carriage_overall_height/2,0]) {
          hull() {
            translate([0,-0.5,0]) {
              square([body_width,1],center=true);
            }
            translate([0,misc_mount_hole_len/2,0]) {
              rounded_square(body_width,misc_mount_hole_len,wall_thickness*2);
            }
          }

          for(x=[left,right]) {
            translate([x*body_width/2,0,0]) {
              rotate([0,0,45-x*45]) {
                # round_corner_filler_profile(misc_mount_hole_len,resolution);
              }
            }
          }
        }
      }

      // round top of y carriage with bearing holder
      translate([left*cavity_overall_width/2,y_carriage_overall_height/2,0]) {
        round_corner_filler_profile(printed_carriage_inner_diam*3);
      }
      translate([-y_carriage_overall_width/4,y_carriage_overall_height/2-wall_thickness,0]) {
        square([y_carriage_overall_width/2,wall_thickness*2],center=true);
      }

      translate([left*(y_rail_extrusion_width/2+printed_carriage_outer_skin_from_extrusion),line_bearing_pos_z-bearing_arm_support_overall_height/2,0]) {
        rotate([0,0,-180]) {
          round_corner_filler_profile(gap_between_x_rail_end_and_y_carriage);
        }
      }
    }

    module profile_holes() {
    }

    difference() {
      profile_body();
      profile_holes();
    }
  }

  module body() {
    rotate([90,0,0]) {
      linear_extrude(height=y_carriage_depth,center=true,convexity=10) {
        carriage_profile();
      }
      rotate([0,0,90]) {
        % extrusion_2040(10);
      }
    }

    line_bearing_cavity_diam = line_bearing_diam+gap_between_x_rail_end_and_y_carriage*2+0.5;
    xz_position_for_line_bearing() {
      // line bearing bevels
      for(y=[front,rear]) {
        for(z=[top,bottom]) {
          translate([0,y*10,z*(line_bearing_thickness_gap/2+bearing_bevel_height)]) {
            hull() {
              hole(line_bearing_hole_diam+extrude_width*2,bearing_bevel_height*2);
              translate([0,0,z*1]) {
                hole(line_bearing_hole_diam+(extrude_width+bearing_bevel_height)*2,2);
              }
            }
          }
        }
      }
    }
  }

  module holes() {
    bushing_from_wall = x_rail_extrusion_height/5;

    xz_position_for_line_bearing() {
      // line bearing holes
      for(y=[front,rear]) {
        translate([0,y*10,0]) {
          hole(line_bearing_hole_diam,30);
        }
      }
    }

    // mounting holes for misc
    if (side == right) {
      for(y=[front,rear]) {
        translate([0,y*misc_mount_hole_spacing/2,y_carriage_overall_height/2+misc_mount_hole_len/2+1]) {
          # hole(misc_mount_hole_diam,misc_mount_hole_len+2,8);
        }
      }
    }
  }

  difference() {
    body();
    holes();
  }
}

module y_carriage(side) {
  if (1) {
    preloaded_spring_y_carriage(side);
  } else {
    ptfe_y_carriage(side);
  }
}

module to_print(side) {
  rotate([-90,0,0]) {
    y_carriage(side);
  }
}

y_carriage(right);
